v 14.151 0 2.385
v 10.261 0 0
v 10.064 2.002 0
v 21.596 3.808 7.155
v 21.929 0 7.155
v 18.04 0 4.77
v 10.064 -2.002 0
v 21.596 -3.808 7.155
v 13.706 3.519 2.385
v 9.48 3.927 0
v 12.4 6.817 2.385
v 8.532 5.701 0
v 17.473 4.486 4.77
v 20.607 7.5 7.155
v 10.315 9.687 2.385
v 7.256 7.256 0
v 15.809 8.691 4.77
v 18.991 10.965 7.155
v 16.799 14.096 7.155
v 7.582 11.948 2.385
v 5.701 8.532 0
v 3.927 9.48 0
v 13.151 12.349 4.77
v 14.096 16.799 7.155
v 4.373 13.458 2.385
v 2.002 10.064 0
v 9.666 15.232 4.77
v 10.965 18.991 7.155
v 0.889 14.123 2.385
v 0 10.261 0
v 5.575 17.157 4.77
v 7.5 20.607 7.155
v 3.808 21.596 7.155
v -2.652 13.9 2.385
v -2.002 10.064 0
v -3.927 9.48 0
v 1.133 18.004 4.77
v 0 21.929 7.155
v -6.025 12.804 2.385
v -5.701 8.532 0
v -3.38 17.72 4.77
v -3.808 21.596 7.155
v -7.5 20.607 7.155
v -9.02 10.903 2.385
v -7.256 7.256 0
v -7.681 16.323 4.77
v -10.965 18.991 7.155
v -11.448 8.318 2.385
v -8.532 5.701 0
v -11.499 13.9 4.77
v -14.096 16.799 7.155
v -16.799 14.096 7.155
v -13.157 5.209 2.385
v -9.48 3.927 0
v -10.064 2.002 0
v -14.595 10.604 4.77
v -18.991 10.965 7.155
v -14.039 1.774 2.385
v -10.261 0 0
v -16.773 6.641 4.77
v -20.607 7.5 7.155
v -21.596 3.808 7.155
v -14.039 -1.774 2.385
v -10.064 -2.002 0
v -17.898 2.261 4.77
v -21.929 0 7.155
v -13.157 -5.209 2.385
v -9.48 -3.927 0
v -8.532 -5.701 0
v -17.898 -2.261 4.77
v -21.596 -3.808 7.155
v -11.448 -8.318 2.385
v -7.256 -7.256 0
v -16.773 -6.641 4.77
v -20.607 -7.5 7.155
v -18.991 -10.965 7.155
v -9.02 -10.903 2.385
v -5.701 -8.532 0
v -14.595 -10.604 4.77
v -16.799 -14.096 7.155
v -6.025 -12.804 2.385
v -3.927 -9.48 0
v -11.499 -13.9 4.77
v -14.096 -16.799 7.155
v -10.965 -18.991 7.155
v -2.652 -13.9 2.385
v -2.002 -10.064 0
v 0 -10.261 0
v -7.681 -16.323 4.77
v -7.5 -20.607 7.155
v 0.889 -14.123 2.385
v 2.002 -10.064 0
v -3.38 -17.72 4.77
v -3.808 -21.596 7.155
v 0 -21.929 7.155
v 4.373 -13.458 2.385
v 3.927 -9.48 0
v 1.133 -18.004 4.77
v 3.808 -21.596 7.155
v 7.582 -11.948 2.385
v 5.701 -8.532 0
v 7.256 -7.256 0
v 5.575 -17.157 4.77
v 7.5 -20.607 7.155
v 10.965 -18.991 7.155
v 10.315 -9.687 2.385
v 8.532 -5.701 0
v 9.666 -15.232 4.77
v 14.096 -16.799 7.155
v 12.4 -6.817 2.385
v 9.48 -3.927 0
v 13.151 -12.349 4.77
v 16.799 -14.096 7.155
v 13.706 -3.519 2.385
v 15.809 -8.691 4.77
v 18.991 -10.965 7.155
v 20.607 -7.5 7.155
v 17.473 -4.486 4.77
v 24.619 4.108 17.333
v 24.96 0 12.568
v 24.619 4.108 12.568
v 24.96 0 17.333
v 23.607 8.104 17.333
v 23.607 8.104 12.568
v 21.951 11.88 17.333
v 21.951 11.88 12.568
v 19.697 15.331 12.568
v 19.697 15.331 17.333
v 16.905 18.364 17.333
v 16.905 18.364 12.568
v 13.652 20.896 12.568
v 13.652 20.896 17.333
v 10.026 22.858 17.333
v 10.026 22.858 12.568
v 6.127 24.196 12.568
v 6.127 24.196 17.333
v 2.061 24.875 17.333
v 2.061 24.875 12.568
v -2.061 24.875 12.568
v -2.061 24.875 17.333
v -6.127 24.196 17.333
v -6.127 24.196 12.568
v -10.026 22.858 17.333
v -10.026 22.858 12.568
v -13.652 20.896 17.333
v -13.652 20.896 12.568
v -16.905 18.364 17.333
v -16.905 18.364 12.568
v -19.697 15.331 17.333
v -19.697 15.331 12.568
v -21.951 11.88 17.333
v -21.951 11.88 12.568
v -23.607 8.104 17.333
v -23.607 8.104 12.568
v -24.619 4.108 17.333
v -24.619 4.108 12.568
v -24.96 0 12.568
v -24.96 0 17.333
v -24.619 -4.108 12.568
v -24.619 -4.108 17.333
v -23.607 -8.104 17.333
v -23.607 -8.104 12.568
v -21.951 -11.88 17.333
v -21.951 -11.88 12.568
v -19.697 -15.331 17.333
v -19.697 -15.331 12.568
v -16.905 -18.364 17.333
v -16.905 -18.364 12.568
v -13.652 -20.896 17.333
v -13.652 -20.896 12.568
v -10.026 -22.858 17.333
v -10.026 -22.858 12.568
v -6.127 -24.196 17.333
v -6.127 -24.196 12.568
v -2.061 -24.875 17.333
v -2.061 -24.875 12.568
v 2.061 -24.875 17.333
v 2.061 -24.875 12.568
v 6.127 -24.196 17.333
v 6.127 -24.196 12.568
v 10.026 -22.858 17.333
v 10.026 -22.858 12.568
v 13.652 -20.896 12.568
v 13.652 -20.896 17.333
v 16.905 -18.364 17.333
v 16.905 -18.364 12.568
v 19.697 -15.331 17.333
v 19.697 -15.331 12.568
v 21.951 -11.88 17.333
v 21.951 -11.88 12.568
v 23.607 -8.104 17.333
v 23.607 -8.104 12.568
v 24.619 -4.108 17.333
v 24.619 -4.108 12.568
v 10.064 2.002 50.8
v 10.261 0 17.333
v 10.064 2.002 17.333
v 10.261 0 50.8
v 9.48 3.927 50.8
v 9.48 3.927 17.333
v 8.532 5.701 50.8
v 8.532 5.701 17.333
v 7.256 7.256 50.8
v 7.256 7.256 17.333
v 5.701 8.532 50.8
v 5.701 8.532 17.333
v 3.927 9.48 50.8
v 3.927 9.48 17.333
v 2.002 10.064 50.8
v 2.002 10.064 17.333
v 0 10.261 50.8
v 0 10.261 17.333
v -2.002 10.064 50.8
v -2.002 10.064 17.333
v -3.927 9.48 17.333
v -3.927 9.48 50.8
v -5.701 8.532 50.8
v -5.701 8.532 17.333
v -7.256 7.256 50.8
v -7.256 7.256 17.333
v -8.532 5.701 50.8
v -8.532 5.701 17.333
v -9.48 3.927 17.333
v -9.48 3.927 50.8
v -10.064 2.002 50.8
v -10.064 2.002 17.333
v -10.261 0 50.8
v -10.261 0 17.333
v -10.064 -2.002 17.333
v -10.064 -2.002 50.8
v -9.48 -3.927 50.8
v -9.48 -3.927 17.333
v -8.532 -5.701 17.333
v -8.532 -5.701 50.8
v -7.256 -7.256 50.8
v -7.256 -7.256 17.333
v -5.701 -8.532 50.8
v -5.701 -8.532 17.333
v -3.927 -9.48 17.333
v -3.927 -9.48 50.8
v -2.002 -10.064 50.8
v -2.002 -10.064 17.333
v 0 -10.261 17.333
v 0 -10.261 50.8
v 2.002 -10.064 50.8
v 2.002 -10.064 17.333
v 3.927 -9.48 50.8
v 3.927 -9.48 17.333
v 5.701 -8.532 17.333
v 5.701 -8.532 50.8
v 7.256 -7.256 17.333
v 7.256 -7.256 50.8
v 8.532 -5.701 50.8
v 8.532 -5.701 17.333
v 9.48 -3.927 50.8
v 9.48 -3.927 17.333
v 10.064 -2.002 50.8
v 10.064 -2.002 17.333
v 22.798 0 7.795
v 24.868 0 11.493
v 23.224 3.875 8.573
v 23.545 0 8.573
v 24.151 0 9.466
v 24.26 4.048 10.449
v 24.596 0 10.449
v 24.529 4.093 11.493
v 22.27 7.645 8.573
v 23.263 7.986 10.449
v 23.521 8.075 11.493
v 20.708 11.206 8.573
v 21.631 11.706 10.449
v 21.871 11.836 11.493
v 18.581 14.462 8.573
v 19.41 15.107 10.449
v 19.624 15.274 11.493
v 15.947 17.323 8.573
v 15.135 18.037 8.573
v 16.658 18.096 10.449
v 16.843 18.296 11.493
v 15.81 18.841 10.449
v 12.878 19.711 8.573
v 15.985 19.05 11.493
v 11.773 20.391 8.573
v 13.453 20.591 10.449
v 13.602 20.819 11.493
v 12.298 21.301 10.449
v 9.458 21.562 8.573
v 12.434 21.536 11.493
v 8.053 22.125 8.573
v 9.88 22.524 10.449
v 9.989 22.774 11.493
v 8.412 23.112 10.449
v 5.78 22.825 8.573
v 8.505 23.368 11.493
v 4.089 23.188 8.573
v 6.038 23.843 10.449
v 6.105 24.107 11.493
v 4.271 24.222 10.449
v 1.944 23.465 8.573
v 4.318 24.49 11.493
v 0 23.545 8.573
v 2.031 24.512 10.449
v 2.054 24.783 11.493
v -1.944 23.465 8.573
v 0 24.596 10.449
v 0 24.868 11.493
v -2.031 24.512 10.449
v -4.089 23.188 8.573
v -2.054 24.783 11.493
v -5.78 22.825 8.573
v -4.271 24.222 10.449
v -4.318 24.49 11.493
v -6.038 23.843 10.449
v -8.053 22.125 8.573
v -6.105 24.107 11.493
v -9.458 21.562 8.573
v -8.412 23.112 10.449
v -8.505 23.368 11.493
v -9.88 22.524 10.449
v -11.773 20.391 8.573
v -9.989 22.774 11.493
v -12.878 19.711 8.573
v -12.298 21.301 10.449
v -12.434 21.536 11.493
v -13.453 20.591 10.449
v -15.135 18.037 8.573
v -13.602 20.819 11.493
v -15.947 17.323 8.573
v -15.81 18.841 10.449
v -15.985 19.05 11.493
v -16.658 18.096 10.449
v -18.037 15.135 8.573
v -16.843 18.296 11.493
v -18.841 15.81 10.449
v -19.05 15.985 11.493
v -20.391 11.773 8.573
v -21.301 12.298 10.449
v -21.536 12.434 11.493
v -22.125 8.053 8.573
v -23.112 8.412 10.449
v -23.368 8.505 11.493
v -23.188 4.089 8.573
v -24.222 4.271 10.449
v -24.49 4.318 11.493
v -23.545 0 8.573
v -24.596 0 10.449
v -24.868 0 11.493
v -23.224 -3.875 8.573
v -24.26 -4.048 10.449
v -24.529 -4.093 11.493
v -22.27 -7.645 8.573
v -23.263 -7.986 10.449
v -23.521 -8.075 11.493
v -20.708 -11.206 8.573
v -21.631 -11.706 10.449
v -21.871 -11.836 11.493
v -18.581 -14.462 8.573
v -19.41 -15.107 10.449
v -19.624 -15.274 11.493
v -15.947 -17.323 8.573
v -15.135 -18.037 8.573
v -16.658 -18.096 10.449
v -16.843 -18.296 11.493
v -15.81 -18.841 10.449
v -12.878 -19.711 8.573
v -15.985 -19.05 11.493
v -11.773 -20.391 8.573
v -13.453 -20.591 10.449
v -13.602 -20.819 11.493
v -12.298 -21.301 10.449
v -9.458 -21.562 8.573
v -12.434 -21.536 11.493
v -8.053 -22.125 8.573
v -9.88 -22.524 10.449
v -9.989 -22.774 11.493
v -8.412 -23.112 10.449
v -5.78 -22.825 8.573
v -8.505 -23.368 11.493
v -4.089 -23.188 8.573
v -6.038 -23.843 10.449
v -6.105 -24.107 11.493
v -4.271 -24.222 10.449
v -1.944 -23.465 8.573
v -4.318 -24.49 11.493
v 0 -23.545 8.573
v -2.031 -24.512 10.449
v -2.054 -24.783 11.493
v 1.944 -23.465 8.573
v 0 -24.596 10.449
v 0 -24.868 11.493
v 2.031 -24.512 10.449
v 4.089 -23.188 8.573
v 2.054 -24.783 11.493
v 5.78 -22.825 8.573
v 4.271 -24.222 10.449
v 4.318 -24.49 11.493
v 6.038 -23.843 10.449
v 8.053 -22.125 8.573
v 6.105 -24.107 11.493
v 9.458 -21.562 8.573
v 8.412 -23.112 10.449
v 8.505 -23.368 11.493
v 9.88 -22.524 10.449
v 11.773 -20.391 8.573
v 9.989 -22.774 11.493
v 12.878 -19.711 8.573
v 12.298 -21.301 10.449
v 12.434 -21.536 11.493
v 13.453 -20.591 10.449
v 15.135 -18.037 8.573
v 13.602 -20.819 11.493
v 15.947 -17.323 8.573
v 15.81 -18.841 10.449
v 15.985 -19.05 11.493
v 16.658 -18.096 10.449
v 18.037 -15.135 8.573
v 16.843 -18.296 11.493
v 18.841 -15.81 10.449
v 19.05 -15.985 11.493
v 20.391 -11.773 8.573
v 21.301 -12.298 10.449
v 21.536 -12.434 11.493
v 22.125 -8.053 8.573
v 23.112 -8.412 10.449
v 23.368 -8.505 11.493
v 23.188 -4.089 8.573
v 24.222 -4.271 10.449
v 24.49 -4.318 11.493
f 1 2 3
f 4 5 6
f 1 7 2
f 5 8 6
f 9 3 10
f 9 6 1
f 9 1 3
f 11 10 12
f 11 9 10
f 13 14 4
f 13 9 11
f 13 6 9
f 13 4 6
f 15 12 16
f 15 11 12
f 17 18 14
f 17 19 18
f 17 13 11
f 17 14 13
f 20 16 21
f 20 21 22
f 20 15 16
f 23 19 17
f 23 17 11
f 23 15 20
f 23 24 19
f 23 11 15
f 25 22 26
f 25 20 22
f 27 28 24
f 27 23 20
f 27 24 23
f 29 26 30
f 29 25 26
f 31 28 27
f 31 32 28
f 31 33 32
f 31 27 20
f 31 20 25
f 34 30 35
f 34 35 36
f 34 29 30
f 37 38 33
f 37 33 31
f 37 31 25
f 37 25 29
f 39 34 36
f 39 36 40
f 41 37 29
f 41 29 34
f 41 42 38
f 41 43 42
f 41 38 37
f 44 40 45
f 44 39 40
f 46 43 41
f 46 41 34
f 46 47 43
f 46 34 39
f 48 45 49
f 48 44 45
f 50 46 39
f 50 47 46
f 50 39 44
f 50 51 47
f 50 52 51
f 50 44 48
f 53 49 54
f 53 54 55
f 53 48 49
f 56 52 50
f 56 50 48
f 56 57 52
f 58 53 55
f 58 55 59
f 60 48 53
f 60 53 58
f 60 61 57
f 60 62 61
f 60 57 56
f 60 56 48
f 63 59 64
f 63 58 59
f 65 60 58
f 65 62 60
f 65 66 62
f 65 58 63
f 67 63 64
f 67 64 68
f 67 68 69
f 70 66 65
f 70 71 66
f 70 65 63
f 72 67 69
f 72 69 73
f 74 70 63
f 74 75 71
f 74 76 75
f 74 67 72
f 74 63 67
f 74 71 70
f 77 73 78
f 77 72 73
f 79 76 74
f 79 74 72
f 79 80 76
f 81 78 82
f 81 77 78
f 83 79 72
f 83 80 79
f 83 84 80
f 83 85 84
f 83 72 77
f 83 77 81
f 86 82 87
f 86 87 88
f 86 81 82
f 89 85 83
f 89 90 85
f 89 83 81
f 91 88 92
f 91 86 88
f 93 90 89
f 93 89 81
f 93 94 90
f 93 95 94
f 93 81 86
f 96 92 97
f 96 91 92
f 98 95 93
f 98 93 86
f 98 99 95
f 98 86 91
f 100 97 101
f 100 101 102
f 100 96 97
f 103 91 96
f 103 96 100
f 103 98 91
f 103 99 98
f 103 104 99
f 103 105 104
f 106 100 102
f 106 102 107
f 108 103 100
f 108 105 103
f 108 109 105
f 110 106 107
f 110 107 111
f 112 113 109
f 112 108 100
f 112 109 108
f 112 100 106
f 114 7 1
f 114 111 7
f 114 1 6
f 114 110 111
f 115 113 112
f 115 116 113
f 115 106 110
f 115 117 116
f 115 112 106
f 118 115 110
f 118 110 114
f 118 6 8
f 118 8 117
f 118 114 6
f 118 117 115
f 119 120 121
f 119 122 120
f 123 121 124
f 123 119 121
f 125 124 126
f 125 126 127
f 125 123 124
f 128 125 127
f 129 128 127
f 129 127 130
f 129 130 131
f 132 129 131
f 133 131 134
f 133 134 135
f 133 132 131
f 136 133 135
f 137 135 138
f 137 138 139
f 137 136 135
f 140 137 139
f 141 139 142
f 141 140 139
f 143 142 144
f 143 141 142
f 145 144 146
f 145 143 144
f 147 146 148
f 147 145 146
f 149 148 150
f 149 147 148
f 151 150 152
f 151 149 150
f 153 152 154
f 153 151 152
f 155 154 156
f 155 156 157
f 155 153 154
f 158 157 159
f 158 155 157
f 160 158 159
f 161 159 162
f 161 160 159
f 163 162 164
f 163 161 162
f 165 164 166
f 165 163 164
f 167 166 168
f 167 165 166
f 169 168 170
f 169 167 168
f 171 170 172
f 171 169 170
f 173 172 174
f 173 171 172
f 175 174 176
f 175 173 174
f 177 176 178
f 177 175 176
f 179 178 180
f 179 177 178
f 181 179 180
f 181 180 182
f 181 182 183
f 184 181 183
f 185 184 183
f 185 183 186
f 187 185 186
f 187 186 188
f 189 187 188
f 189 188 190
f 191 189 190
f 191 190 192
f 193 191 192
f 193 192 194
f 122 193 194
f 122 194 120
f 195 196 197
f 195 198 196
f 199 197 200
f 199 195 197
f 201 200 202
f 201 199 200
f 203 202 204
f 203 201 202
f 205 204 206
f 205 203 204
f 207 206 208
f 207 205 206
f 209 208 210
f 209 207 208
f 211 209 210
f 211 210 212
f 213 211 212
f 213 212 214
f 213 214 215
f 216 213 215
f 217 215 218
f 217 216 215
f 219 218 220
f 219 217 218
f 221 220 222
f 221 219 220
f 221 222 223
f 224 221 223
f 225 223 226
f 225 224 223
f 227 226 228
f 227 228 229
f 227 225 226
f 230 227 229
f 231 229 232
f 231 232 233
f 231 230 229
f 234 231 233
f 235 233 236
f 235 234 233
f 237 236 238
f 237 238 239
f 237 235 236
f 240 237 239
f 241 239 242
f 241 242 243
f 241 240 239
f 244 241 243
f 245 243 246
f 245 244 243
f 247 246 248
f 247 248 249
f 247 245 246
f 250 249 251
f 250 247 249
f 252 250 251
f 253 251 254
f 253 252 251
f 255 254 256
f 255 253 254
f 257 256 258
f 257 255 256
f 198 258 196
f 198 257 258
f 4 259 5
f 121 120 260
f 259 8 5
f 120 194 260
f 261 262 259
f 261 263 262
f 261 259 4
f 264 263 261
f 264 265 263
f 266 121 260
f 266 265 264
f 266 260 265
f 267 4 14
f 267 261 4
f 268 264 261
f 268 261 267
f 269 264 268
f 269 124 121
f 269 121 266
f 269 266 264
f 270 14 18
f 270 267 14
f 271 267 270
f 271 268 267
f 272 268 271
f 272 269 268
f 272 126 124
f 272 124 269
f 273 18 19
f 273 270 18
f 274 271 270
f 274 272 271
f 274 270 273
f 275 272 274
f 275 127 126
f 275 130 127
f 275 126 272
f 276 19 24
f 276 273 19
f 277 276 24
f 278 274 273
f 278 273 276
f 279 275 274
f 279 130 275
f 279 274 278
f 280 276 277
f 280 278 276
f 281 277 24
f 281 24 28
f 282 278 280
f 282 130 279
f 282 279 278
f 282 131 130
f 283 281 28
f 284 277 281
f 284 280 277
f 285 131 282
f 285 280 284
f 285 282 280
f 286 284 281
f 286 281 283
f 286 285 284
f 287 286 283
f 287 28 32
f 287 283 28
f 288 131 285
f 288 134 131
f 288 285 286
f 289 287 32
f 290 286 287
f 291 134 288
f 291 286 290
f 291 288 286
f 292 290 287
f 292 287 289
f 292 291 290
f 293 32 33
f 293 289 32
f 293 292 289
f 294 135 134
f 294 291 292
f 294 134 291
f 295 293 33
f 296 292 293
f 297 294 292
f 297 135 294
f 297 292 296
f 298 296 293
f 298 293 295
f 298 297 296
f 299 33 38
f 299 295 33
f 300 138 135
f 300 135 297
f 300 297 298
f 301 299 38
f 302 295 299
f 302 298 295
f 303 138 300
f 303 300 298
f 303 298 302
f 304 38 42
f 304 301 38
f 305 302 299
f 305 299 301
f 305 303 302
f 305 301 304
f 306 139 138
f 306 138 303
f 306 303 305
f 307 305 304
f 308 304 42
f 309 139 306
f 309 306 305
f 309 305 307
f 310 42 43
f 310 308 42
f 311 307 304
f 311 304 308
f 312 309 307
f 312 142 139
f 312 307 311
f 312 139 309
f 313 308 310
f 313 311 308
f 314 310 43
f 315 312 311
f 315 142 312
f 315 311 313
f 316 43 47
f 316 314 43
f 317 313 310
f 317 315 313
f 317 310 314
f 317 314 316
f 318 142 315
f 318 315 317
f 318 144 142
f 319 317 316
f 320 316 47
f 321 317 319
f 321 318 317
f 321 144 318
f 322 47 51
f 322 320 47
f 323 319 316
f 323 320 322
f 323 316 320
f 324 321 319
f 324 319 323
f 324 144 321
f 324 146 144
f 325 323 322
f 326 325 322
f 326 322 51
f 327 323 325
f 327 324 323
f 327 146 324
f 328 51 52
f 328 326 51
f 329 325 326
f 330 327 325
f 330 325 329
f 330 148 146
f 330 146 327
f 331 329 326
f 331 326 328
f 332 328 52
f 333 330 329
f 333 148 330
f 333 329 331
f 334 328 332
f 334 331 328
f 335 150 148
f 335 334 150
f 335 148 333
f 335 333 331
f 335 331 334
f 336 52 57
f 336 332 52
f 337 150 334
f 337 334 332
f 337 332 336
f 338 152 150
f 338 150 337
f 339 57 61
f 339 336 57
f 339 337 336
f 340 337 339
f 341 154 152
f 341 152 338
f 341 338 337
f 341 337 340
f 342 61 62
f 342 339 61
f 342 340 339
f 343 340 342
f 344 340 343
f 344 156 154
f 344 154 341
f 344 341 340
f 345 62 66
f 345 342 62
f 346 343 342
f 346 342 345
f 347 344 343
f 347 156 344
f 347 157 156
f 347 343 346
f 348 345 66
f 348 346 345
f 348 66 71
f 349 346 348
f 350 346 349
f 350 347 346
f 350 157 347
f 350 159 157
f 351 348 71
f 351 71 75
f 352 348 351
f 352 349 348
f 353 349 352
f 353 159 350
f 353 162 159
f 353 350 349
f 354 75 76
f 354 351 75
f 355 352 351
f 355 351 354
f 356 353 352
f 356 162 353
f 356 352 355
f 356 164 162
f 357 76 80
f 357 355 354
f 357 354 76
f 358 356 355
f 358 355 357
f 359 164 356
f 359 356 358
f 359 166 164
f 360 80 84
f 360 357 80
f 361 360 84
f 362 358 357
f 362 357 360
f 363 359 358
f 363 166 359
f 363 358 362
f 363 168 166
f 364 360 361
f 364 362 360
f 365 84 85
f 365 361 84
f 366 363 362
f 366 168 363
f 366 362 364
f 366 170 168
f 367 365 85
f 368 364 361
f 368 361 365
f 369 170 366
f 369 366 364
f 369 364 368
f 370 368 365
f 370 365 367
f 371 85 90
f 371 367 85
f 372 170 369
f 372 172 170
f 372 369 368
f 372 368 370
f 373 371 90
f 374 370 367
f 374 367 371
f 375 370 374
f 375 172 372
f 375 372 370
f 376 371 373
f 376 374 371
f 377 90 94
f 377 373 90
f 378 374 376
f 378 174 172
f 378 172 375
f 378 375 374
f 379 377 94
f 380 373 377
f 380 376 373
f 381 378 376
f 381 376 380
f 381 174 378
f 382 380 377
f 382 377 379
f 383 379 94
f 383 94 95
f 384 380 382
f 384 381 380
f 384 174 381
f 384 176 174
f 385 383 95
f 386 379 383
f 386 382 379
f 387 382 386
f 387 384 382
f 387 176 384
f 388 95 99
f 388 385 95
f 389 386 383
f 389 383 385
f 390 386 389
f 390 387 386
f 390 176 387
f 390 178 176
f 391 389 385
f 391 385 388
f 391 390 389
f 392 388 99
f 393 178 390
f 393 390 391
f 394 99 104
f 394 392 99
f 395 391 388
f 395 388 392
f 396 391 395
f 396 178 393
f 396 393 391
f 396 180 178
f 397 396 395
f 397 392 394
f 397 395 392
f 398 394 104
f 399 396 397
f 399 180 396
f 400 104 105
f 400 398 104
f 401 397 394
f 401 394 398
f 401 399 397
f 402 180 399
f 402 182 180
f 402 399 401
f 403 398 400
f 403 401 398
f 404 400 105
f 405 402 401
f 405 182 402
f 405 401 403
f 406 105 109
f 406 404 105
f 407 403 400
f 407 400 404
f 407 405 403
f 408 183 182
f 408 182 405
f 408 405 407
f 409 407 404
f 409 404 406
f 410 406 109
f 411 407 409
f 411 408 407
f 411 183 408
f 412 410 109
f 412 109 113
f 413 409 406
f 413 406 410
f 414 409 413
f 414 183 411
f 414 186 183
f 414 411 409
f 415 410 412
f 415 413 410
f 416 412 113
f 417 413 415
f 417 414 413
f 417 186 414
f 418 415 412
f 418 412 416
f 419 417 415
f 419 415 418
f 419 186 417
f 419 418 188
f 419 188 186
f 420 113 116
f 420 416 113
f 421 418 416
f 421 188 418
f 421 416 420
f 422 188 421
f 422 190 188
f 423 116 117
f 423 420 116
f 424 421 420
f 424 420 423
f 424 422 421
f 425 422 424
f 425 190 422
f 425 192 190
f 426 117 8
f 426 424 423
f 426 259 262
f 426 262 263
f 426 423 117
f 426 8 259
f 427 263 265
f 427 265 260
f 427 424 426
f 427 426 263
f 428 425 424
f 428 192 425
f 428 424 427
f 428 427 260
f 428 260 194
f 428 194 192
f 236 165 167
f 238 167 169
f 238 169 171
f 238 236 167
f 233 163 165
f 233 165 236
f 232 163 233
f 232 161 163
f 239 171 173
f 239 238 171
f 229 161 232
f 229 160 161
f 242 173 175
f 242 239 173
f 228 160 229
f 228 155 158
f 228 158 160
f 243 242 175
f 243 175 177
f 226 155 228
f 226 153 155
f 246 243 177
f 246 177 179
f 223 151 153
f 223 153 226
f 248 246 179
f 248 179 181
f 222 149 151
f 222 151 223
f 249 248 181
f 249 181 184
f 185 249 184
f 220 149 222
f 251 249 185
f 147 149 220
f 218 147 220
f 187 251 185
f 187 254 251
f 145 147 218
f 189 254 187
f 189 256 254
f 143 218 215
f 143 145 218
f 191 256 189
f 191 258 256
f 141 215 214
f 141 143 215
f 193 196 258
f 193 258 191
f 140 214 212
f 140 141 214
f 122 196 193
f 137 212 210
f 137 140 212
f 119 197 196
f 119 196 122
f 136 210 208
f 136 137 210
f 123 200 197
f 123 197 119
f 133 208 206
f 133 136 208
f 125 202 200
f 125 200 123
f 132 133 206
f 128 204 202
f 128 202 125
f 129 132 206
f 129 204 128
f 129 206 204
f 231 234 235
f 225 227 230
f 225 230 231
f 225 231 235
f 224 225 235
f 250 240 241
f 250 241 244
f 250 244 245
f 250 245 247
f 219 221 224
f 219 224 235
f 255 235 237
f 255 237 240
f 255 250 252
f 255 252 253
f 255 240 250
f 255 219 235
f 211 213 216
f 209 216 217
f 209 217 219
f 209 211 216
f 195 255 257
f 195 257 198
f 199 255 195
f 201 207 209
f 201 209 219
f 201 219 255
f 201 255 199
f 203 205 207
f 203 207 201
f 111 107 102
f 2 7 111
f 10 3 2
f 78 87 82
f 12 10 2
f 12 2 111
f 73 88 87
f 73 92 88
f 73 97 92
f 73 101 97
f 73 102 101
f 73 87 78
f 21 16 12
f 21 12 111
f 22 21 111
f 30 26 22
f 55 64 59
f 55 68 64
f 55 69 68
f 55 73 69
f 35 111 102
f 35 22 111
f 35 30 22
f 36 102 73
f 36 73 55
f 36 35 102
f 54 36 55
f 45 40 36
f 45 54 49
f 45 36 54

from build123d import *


with BuildPart() as f1:
    # F0 (on Front) → F1 (revolve)
    with BuildSketch(Plane.XZ):
        with BuildLine():
            Line((0, 50.8), (0, 0))
            Line((0, 0), (10.261248, 0))
            Line((10.261248, 0), (21.929258, 7.154912))
            ThreePointArc((21.929258, 7.154912), (24.1506, 9.46627), (24.959791, 12.568196))
            Line((24.959791, 12.568196), (24.959791, 17.333189))
            Line((24.959791, 17.333189), (10.261248, 17.333189))
            Line((10.261248, 17.333189), (10.261248, 50.8))
            Line((10.261248, 50.8), (0, 50.8))
        make_face()
    revolve(axis=Axis((0, 0, 25.4), (0, 0, 1)))


solid = f1.part
